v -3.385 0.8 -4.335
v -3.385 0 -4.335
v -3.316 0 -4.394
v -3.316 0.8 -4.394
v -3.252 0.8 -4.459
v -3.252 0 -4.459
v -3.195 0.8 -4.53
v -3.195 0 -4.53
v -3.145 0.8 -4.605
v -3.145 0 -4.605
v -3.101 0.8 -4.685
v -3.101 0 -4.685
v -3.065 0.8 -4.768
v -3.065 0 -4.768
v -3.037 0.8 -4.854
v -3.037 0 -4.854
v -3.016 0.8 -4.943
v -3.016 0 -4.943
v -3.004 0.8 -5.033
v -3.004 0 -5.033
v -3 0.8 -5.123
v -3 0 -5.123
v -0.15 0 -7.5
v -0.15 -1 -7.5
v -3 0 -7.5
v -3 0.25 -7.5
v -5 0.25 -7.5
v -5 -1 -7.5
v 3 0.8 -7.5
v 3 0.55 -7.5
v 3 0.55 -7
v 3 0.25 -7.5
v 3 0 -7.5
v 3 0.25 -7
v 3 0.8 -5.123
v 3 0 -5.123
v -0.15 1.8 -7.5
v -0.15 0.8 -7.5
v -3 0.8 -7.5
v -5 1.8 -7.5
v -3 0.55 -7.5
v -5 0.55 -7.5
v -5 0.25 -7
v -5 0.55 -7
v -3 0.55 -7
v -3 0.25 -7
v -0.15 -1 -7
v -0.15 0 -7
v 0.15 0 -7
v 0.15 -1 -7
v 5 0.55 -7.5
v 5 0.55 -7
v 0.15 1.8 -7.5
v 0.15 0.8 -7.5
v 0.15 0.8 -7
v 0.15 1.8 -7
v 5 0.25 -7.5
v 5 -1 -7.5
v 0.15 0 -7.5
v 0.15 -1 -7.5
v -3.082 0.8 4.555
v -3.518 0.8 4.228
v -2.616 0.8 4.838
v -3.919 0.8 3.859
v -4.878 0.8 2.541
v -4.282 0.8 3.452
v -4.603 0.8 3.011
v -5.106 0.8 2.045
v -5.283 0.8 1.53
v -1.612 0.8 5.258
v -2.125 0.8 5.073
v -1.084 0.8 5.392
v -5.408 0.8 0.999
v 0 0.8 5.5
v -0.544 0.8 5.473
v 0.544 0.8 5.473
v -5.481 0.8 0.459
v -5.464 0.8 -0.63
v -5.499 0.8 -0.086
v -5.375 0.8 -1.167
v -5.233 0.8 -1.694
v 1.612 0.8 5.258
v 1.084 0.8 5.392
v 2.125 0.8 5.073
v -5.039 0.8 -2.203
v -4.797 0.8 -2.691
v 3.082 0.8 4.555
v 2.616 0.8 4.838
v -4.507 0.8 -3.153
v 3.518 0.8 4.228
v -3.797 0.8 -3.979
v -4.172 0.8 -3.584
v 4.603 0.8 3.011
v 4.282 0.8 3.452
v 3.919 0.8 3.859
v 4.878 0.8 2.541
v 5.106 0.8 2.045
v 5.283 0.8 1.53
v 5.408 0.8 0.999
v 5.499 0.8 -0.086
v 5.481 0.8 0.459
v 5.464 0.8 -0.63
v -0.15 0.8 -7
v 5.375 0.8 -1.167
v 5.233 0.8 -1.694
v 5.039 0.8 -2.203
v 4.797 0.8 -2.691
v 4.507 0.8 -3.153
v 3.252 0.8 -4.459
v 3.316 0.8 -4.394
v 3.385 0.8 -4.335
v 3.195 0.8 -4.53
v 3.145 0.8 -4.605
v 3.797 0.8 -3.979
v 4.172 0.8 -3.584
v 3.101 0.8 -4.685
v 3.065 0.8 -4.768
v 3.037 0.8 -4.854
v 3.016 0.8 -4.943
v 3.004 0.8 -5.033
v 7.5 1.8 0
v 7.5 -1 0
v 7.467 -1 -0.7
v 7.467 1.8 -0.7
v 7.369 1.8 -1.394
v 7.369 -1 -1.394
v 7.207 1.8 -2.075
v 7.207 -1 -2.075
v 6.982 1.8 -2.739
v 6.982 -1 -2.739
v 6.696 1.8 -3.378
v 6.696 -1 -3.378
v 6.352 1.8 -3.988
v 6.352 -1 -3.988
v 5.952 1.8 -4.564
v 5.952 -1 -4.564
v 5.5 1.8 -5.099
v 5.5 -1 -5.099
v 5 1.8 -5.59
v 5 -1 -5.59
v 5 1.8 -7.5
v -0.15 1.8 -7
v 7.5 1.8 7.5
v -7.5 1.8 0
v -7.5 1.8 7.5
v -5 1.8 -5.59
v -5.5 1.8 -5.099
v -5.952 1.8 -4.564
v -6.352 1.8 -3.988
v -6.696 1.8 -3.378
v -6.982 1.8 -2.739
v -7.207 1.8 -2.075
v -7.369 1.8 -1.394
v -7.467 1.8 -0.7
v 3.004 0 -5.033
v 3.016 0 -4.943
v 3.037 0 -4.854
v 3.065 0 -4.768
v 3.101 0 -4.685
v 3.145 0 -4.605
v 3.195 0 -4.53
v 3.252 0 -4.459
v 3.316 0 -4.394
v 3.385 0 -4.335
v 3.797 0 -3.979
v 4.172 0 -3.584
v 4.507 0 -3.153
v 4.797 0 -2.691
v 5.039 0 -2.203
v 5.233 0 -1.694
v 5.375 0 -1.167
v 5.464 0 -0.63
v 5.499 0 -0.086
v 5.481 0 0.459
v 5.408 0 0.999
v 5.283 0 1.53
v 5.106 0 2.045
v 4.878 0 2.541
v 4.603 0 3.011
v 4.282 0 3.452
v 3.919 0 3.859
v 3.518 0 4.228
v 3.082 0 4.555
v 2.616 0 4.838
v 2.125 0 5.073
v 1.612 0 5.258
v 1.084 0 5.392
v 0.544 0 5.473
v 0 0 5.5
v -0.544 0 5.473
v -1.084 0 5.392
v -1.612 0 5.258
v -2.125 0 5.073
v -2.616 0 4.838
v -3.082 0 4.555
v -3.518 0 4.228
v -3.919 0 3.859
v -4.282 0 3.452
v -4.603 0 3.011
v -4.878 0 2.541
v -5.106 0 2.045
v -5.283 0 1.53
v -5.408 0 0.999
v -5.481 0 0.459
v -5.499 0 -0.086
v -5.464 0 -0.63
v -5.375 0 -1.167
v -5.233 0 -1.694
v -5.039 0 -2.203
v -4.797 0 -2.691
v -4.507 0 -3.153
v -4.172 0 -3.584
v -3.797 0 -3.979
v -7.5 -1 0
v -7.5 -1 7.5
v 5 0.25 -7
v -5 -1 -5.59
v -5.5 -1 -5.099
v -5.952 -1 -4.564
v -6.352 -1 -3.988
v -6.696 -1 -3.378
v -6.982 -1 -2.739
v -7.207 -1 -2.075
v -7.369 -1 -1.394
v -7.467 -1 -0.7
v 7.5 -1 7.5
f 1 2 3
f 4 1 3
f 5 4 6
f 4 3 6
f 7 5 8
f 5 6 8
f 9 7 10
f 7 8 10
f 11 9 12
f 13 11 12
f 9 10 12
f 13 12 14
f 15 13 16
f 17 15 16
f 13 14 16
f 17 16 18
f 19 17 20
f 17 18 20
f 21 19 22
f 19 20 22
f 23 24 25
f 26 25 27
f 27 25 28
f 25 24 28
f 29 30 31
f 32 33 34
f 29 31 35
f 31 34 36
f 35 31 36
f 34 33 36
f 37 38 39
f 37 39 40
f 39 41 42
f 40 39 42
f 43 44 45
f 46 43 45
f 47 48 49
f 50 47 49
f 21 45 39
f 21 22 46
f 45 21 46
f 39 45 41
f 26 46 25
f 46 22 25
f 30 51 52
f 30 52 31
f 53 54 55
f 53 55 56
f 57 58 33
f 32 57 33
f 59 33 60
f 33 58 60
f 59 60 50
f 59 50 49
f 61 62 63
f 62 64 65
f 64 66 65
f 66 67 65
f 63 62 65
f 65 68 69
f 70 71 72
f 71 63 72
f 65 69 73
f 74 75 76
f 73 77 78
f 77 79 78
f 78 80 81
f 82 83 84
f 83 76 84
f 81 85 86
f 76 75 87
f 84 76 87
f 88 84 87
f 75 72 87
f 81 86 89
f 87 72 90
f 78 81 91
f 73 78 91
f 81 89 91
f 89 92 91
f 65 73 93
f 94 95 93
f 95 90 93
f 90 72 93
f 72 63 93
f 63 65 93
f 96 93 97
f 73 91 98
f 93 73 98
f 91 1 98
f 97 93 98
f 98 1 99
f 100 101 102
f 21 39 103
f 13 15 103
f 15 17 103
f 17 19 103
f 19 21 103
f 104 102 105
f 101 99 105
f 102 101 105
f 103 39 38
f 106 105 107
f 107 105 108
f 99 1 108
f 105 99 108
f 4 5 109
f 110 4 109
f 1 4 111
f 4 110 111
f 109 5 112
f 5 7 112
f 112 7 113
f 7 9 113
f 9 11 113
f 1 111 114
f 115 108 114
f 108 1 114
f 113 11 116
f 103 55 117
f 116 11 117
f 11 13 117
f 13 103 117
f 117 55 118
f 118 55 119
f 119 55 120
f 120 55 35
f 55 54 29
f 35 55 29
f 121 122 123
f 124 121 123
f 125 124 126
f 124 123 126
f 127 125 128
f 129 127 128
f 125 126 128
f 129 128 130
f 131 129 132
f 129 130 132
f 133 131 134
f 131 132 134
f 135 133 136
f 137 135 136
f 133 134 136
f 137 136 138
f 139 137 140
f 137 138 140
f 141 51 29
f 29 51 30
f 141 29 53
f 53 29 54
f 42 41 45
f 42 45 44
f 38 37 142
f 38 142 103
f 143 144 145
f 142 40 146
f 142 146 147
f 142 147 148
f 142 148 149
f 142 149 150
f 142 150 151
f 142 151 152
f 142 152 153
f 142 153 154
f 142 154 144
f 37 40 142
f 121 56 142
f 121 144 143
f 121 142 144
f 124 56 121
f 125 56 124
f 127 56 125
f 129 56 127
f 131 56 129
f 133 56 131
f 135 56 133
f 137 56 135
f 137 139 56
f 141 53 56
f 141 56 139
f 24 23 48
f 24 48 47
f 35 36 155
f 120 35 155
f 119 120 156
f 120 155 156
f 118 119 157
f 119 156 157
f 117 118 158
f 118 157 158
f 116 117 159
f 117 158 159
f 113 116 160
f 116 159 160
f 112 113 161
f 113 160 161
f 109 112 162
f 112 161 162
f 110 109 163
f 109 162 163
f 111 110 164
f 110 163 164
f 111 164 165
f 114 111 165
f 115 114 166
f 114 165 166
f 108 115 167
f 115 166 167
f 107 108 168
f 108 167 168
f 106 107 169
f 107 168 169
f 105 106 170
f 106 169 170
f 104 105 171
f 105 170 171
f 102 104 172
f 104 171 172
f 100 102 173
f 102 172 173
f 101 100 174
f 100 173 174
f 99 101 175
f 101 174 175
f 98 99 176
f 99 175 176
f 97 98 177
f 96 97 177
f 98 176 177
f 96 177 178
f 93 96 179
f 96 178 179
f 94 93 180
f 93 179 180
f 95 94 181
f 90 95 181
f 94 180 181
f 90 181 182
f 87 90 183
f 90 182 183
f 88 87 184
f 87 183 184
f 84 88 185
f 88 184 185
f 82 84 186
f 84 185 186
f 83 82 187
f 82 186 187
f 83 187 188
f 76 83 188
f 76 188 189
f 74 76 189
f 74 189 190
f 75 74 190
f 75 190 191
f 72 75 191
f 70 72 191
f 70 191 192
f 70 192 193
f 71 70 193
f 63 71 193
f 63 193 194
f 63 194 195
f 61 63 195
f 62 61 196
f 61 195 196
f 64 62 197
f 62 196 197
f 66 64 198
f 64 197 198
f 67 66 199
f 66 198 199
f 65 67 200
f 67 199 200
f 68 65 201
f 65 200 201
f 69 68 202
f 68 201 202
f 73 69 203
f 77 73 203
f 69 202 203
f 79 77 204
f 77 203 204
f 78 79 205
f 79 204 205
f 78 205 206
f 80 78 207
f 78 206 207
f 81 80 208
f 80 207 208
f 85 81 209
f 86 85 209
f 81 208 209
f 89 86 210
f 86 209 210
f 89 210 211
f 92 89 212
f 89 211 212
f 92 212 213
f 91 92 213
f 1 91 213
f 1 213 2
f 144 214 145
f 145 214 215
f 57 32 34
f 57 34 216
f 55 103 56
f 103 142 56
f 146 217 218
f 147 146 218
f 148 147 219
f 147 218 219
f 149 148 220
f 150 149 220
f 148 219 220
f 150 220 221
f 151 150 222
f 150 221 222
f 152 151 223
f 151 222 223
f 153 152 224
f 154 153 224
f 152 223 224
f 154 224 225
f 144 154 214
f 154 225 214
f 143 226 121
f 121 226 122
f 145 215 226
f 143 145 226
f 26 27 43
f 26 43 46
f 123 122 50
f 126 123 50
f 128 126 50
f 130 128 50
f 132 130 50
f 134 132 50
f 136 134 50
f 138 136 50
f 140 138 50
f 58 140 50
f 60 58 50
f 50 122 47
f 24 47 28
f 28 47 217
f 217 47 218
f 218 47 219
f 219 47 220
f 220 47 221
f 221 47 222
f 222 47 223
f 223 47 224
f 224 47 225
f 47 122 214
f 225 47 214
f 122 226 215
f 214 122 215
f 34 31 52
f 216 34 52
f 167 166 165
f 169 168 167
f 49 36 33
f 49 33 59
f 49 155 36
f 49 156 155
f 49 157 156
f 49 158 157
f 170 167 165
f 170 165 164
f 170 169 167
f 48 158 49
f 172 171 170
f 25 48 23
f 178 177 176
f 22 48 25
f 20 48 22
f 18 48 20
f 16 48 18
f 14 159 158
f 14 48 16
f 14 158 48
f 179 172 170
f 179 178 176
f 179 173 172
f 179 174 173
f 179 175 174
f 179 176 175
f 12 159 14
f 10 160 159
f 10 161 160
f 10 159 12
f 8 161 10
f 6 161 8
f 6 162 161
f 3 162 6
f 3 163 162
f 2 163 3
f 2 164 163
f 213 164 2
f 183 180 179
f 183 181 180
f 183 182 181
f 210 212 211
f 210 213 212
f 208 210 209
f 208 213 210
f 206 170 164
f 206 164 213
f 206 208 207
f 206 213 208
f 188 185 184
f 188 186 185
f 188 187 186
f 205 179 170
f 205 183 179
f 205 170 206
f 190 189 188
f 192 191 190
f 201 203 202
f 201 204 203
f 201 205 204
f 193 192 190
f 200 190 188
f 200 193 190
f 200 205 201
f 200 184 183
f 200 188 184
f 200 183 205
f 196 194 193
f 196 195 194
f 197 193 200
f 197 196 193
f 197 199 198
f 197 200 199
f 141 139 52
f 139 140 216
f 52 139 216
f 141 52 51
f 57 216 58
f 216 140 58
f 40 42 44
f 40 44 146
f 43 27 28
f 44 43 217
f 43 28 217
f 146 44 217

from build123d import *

# Parameters (mm, degrees)
BOSS_EXTRUDE1_DEPTH = 0.8
BOSS_EXTRUDE2_DEPTH = 1
BOSS_EXTRUDE3_START = 1
BOSS_EXTRUDE3_DEPTH = 1
CUT_EXTRUDE1_DEPTH  = 0.5


with BuildPart() as part:
    # Sketch1 → Boss-Extrude1 (new body)
    with BuildSketch(Plane(origin=(0, 0, 0), x_dir=(1, 0, 0), z_dir=(0, 1, 0))):
        with BuildLine():
            Line((-5, 7.5), (-5, 5.590169944))
            ThreePointArc((-5, 5.590169944), (-6.846531969, 3.061862178), (-7.5, 0))
            Line((-7.5, 0), (-7.5, -7.5))
            Line((-7.5, -7.5), (7.5, -7.5))
            Line((7.5, -7.5), (7.5, 0))
            ThreePointArc((7.5, 0), (6.846531969, 3.061862178), (5, 5.590169944))
            Line((5, 5.590169944), (5, 7.5))
            Line((5, 7.5), (3, 7.5))
            Line((3, 7.5), (3, 5.5))
            Line((3, 5.5), (3, 5.123475383))
            ThreePointArc((3, 5.123475383), (3.101282966, 4.684946373), (3.384615385, 4.335248401))
            ThreePointArc((3.384615385, 4.335248401), (0, -5.5), (-3.384615385, 4.335248401))
            ThreePointArc((-3.384615385, 4.335248401), (-3.101282966, 4.684946373), (-3, 5.123475383))
            Line((-3, 5.123475383), (-3, 5.5))
            Line((-3, 5.5), (-3, 7.5))
            Line((-3, 7.5), (-5, 7.5))
        make_face()
    extrude(amount=BOSS_EXTRUDE1_DEPTH)

    # Sketch2 → Boss-Extrude2 (add)
    with BuildSketch(Plane(origin=(0, 0.8, 0), x_dir=(1, 0, 0), z_dir=(0, 1, 0))):
        with BuildLine():
            Line((5, 5.590169944), (5, 7.5))
            Line((5, 7.5), (3, 7.5))
            Line((3, 7.5), (-3, 7.5))
            Line((-3, 7.5), (-5, 7.5))
            Line((-5, 7.5), (-5, 5.590169944))
            ThreePointArc((-5, 5.590169944), (-6.846531969, 3.061862178), (-7.5, 0))
            Line((-7.5, 0), (-7.5, -7.5))
            Line((-7.5, -7.5), (7.5, -7.5))
            Line((7.5, -7.5), (7.5, 0))
            ThreePointArc((7.5, 0), (6.846531969, 3.061862178), (5, 5.590169944))
        make_face()
    extrude(amount=BOSS_EXTRUDE2_DEPTH)

    # Sketch3 → Boss-Extrude3 (add)
    with BuildSketch(Plane.XZ.offset(BOSS_EXTRUDE3_START)):
        with BuildLine():
            Line((-3, -7.5), (-5, -7.5))
            Line((-5, -7.5), (-5, -5.590169944))
            ThreePointArc((-5, -5.590169944), (-6.846531969, -3.061862178), (-7.5, 0))
            Line((-7.5, 0), (-7.5, 7.5))
            Line((-7.5, 7.5), (7.5, 7.5))
            Line((7.5, 7.5), (7.5, 0))
            ThreePointArc((7.5, 0), (6.846531969, -3.061862178), (5, -5.590169944))
            Line((5, -5.590169944), (5, -7.5))
            Line((5, -7.5), (3, -7.5))
            Line((3, -7.5), (-3, -7.5))
        make_face()
    extrude(amount=-BOSS_EXTRUDE3_DEPTH)

    # Sketch4 → Cut-Extrude1 (cut)
    with BuildSketch(Plane(origin=(0, 0, -7.5), x_dir=(-1, 0, 0), z_dir=(0, 0, -1))):
        Polygon((-5, 0.55), (-0.15, 0.55), (-0.15, 1.8), (0.15, 1.8), (0.15, 0.55), (5, 0.55), (5, 0.25), (0.15, 0.25), (0.15, -1), (-0.15, -1), (-0.15, 0.25), (-5, 0.25), align=None)
    extrude(amount=-CUT_EXTRUDE1_DEPTH, mode=Mode.SUBTRACT)


solid = part.part
